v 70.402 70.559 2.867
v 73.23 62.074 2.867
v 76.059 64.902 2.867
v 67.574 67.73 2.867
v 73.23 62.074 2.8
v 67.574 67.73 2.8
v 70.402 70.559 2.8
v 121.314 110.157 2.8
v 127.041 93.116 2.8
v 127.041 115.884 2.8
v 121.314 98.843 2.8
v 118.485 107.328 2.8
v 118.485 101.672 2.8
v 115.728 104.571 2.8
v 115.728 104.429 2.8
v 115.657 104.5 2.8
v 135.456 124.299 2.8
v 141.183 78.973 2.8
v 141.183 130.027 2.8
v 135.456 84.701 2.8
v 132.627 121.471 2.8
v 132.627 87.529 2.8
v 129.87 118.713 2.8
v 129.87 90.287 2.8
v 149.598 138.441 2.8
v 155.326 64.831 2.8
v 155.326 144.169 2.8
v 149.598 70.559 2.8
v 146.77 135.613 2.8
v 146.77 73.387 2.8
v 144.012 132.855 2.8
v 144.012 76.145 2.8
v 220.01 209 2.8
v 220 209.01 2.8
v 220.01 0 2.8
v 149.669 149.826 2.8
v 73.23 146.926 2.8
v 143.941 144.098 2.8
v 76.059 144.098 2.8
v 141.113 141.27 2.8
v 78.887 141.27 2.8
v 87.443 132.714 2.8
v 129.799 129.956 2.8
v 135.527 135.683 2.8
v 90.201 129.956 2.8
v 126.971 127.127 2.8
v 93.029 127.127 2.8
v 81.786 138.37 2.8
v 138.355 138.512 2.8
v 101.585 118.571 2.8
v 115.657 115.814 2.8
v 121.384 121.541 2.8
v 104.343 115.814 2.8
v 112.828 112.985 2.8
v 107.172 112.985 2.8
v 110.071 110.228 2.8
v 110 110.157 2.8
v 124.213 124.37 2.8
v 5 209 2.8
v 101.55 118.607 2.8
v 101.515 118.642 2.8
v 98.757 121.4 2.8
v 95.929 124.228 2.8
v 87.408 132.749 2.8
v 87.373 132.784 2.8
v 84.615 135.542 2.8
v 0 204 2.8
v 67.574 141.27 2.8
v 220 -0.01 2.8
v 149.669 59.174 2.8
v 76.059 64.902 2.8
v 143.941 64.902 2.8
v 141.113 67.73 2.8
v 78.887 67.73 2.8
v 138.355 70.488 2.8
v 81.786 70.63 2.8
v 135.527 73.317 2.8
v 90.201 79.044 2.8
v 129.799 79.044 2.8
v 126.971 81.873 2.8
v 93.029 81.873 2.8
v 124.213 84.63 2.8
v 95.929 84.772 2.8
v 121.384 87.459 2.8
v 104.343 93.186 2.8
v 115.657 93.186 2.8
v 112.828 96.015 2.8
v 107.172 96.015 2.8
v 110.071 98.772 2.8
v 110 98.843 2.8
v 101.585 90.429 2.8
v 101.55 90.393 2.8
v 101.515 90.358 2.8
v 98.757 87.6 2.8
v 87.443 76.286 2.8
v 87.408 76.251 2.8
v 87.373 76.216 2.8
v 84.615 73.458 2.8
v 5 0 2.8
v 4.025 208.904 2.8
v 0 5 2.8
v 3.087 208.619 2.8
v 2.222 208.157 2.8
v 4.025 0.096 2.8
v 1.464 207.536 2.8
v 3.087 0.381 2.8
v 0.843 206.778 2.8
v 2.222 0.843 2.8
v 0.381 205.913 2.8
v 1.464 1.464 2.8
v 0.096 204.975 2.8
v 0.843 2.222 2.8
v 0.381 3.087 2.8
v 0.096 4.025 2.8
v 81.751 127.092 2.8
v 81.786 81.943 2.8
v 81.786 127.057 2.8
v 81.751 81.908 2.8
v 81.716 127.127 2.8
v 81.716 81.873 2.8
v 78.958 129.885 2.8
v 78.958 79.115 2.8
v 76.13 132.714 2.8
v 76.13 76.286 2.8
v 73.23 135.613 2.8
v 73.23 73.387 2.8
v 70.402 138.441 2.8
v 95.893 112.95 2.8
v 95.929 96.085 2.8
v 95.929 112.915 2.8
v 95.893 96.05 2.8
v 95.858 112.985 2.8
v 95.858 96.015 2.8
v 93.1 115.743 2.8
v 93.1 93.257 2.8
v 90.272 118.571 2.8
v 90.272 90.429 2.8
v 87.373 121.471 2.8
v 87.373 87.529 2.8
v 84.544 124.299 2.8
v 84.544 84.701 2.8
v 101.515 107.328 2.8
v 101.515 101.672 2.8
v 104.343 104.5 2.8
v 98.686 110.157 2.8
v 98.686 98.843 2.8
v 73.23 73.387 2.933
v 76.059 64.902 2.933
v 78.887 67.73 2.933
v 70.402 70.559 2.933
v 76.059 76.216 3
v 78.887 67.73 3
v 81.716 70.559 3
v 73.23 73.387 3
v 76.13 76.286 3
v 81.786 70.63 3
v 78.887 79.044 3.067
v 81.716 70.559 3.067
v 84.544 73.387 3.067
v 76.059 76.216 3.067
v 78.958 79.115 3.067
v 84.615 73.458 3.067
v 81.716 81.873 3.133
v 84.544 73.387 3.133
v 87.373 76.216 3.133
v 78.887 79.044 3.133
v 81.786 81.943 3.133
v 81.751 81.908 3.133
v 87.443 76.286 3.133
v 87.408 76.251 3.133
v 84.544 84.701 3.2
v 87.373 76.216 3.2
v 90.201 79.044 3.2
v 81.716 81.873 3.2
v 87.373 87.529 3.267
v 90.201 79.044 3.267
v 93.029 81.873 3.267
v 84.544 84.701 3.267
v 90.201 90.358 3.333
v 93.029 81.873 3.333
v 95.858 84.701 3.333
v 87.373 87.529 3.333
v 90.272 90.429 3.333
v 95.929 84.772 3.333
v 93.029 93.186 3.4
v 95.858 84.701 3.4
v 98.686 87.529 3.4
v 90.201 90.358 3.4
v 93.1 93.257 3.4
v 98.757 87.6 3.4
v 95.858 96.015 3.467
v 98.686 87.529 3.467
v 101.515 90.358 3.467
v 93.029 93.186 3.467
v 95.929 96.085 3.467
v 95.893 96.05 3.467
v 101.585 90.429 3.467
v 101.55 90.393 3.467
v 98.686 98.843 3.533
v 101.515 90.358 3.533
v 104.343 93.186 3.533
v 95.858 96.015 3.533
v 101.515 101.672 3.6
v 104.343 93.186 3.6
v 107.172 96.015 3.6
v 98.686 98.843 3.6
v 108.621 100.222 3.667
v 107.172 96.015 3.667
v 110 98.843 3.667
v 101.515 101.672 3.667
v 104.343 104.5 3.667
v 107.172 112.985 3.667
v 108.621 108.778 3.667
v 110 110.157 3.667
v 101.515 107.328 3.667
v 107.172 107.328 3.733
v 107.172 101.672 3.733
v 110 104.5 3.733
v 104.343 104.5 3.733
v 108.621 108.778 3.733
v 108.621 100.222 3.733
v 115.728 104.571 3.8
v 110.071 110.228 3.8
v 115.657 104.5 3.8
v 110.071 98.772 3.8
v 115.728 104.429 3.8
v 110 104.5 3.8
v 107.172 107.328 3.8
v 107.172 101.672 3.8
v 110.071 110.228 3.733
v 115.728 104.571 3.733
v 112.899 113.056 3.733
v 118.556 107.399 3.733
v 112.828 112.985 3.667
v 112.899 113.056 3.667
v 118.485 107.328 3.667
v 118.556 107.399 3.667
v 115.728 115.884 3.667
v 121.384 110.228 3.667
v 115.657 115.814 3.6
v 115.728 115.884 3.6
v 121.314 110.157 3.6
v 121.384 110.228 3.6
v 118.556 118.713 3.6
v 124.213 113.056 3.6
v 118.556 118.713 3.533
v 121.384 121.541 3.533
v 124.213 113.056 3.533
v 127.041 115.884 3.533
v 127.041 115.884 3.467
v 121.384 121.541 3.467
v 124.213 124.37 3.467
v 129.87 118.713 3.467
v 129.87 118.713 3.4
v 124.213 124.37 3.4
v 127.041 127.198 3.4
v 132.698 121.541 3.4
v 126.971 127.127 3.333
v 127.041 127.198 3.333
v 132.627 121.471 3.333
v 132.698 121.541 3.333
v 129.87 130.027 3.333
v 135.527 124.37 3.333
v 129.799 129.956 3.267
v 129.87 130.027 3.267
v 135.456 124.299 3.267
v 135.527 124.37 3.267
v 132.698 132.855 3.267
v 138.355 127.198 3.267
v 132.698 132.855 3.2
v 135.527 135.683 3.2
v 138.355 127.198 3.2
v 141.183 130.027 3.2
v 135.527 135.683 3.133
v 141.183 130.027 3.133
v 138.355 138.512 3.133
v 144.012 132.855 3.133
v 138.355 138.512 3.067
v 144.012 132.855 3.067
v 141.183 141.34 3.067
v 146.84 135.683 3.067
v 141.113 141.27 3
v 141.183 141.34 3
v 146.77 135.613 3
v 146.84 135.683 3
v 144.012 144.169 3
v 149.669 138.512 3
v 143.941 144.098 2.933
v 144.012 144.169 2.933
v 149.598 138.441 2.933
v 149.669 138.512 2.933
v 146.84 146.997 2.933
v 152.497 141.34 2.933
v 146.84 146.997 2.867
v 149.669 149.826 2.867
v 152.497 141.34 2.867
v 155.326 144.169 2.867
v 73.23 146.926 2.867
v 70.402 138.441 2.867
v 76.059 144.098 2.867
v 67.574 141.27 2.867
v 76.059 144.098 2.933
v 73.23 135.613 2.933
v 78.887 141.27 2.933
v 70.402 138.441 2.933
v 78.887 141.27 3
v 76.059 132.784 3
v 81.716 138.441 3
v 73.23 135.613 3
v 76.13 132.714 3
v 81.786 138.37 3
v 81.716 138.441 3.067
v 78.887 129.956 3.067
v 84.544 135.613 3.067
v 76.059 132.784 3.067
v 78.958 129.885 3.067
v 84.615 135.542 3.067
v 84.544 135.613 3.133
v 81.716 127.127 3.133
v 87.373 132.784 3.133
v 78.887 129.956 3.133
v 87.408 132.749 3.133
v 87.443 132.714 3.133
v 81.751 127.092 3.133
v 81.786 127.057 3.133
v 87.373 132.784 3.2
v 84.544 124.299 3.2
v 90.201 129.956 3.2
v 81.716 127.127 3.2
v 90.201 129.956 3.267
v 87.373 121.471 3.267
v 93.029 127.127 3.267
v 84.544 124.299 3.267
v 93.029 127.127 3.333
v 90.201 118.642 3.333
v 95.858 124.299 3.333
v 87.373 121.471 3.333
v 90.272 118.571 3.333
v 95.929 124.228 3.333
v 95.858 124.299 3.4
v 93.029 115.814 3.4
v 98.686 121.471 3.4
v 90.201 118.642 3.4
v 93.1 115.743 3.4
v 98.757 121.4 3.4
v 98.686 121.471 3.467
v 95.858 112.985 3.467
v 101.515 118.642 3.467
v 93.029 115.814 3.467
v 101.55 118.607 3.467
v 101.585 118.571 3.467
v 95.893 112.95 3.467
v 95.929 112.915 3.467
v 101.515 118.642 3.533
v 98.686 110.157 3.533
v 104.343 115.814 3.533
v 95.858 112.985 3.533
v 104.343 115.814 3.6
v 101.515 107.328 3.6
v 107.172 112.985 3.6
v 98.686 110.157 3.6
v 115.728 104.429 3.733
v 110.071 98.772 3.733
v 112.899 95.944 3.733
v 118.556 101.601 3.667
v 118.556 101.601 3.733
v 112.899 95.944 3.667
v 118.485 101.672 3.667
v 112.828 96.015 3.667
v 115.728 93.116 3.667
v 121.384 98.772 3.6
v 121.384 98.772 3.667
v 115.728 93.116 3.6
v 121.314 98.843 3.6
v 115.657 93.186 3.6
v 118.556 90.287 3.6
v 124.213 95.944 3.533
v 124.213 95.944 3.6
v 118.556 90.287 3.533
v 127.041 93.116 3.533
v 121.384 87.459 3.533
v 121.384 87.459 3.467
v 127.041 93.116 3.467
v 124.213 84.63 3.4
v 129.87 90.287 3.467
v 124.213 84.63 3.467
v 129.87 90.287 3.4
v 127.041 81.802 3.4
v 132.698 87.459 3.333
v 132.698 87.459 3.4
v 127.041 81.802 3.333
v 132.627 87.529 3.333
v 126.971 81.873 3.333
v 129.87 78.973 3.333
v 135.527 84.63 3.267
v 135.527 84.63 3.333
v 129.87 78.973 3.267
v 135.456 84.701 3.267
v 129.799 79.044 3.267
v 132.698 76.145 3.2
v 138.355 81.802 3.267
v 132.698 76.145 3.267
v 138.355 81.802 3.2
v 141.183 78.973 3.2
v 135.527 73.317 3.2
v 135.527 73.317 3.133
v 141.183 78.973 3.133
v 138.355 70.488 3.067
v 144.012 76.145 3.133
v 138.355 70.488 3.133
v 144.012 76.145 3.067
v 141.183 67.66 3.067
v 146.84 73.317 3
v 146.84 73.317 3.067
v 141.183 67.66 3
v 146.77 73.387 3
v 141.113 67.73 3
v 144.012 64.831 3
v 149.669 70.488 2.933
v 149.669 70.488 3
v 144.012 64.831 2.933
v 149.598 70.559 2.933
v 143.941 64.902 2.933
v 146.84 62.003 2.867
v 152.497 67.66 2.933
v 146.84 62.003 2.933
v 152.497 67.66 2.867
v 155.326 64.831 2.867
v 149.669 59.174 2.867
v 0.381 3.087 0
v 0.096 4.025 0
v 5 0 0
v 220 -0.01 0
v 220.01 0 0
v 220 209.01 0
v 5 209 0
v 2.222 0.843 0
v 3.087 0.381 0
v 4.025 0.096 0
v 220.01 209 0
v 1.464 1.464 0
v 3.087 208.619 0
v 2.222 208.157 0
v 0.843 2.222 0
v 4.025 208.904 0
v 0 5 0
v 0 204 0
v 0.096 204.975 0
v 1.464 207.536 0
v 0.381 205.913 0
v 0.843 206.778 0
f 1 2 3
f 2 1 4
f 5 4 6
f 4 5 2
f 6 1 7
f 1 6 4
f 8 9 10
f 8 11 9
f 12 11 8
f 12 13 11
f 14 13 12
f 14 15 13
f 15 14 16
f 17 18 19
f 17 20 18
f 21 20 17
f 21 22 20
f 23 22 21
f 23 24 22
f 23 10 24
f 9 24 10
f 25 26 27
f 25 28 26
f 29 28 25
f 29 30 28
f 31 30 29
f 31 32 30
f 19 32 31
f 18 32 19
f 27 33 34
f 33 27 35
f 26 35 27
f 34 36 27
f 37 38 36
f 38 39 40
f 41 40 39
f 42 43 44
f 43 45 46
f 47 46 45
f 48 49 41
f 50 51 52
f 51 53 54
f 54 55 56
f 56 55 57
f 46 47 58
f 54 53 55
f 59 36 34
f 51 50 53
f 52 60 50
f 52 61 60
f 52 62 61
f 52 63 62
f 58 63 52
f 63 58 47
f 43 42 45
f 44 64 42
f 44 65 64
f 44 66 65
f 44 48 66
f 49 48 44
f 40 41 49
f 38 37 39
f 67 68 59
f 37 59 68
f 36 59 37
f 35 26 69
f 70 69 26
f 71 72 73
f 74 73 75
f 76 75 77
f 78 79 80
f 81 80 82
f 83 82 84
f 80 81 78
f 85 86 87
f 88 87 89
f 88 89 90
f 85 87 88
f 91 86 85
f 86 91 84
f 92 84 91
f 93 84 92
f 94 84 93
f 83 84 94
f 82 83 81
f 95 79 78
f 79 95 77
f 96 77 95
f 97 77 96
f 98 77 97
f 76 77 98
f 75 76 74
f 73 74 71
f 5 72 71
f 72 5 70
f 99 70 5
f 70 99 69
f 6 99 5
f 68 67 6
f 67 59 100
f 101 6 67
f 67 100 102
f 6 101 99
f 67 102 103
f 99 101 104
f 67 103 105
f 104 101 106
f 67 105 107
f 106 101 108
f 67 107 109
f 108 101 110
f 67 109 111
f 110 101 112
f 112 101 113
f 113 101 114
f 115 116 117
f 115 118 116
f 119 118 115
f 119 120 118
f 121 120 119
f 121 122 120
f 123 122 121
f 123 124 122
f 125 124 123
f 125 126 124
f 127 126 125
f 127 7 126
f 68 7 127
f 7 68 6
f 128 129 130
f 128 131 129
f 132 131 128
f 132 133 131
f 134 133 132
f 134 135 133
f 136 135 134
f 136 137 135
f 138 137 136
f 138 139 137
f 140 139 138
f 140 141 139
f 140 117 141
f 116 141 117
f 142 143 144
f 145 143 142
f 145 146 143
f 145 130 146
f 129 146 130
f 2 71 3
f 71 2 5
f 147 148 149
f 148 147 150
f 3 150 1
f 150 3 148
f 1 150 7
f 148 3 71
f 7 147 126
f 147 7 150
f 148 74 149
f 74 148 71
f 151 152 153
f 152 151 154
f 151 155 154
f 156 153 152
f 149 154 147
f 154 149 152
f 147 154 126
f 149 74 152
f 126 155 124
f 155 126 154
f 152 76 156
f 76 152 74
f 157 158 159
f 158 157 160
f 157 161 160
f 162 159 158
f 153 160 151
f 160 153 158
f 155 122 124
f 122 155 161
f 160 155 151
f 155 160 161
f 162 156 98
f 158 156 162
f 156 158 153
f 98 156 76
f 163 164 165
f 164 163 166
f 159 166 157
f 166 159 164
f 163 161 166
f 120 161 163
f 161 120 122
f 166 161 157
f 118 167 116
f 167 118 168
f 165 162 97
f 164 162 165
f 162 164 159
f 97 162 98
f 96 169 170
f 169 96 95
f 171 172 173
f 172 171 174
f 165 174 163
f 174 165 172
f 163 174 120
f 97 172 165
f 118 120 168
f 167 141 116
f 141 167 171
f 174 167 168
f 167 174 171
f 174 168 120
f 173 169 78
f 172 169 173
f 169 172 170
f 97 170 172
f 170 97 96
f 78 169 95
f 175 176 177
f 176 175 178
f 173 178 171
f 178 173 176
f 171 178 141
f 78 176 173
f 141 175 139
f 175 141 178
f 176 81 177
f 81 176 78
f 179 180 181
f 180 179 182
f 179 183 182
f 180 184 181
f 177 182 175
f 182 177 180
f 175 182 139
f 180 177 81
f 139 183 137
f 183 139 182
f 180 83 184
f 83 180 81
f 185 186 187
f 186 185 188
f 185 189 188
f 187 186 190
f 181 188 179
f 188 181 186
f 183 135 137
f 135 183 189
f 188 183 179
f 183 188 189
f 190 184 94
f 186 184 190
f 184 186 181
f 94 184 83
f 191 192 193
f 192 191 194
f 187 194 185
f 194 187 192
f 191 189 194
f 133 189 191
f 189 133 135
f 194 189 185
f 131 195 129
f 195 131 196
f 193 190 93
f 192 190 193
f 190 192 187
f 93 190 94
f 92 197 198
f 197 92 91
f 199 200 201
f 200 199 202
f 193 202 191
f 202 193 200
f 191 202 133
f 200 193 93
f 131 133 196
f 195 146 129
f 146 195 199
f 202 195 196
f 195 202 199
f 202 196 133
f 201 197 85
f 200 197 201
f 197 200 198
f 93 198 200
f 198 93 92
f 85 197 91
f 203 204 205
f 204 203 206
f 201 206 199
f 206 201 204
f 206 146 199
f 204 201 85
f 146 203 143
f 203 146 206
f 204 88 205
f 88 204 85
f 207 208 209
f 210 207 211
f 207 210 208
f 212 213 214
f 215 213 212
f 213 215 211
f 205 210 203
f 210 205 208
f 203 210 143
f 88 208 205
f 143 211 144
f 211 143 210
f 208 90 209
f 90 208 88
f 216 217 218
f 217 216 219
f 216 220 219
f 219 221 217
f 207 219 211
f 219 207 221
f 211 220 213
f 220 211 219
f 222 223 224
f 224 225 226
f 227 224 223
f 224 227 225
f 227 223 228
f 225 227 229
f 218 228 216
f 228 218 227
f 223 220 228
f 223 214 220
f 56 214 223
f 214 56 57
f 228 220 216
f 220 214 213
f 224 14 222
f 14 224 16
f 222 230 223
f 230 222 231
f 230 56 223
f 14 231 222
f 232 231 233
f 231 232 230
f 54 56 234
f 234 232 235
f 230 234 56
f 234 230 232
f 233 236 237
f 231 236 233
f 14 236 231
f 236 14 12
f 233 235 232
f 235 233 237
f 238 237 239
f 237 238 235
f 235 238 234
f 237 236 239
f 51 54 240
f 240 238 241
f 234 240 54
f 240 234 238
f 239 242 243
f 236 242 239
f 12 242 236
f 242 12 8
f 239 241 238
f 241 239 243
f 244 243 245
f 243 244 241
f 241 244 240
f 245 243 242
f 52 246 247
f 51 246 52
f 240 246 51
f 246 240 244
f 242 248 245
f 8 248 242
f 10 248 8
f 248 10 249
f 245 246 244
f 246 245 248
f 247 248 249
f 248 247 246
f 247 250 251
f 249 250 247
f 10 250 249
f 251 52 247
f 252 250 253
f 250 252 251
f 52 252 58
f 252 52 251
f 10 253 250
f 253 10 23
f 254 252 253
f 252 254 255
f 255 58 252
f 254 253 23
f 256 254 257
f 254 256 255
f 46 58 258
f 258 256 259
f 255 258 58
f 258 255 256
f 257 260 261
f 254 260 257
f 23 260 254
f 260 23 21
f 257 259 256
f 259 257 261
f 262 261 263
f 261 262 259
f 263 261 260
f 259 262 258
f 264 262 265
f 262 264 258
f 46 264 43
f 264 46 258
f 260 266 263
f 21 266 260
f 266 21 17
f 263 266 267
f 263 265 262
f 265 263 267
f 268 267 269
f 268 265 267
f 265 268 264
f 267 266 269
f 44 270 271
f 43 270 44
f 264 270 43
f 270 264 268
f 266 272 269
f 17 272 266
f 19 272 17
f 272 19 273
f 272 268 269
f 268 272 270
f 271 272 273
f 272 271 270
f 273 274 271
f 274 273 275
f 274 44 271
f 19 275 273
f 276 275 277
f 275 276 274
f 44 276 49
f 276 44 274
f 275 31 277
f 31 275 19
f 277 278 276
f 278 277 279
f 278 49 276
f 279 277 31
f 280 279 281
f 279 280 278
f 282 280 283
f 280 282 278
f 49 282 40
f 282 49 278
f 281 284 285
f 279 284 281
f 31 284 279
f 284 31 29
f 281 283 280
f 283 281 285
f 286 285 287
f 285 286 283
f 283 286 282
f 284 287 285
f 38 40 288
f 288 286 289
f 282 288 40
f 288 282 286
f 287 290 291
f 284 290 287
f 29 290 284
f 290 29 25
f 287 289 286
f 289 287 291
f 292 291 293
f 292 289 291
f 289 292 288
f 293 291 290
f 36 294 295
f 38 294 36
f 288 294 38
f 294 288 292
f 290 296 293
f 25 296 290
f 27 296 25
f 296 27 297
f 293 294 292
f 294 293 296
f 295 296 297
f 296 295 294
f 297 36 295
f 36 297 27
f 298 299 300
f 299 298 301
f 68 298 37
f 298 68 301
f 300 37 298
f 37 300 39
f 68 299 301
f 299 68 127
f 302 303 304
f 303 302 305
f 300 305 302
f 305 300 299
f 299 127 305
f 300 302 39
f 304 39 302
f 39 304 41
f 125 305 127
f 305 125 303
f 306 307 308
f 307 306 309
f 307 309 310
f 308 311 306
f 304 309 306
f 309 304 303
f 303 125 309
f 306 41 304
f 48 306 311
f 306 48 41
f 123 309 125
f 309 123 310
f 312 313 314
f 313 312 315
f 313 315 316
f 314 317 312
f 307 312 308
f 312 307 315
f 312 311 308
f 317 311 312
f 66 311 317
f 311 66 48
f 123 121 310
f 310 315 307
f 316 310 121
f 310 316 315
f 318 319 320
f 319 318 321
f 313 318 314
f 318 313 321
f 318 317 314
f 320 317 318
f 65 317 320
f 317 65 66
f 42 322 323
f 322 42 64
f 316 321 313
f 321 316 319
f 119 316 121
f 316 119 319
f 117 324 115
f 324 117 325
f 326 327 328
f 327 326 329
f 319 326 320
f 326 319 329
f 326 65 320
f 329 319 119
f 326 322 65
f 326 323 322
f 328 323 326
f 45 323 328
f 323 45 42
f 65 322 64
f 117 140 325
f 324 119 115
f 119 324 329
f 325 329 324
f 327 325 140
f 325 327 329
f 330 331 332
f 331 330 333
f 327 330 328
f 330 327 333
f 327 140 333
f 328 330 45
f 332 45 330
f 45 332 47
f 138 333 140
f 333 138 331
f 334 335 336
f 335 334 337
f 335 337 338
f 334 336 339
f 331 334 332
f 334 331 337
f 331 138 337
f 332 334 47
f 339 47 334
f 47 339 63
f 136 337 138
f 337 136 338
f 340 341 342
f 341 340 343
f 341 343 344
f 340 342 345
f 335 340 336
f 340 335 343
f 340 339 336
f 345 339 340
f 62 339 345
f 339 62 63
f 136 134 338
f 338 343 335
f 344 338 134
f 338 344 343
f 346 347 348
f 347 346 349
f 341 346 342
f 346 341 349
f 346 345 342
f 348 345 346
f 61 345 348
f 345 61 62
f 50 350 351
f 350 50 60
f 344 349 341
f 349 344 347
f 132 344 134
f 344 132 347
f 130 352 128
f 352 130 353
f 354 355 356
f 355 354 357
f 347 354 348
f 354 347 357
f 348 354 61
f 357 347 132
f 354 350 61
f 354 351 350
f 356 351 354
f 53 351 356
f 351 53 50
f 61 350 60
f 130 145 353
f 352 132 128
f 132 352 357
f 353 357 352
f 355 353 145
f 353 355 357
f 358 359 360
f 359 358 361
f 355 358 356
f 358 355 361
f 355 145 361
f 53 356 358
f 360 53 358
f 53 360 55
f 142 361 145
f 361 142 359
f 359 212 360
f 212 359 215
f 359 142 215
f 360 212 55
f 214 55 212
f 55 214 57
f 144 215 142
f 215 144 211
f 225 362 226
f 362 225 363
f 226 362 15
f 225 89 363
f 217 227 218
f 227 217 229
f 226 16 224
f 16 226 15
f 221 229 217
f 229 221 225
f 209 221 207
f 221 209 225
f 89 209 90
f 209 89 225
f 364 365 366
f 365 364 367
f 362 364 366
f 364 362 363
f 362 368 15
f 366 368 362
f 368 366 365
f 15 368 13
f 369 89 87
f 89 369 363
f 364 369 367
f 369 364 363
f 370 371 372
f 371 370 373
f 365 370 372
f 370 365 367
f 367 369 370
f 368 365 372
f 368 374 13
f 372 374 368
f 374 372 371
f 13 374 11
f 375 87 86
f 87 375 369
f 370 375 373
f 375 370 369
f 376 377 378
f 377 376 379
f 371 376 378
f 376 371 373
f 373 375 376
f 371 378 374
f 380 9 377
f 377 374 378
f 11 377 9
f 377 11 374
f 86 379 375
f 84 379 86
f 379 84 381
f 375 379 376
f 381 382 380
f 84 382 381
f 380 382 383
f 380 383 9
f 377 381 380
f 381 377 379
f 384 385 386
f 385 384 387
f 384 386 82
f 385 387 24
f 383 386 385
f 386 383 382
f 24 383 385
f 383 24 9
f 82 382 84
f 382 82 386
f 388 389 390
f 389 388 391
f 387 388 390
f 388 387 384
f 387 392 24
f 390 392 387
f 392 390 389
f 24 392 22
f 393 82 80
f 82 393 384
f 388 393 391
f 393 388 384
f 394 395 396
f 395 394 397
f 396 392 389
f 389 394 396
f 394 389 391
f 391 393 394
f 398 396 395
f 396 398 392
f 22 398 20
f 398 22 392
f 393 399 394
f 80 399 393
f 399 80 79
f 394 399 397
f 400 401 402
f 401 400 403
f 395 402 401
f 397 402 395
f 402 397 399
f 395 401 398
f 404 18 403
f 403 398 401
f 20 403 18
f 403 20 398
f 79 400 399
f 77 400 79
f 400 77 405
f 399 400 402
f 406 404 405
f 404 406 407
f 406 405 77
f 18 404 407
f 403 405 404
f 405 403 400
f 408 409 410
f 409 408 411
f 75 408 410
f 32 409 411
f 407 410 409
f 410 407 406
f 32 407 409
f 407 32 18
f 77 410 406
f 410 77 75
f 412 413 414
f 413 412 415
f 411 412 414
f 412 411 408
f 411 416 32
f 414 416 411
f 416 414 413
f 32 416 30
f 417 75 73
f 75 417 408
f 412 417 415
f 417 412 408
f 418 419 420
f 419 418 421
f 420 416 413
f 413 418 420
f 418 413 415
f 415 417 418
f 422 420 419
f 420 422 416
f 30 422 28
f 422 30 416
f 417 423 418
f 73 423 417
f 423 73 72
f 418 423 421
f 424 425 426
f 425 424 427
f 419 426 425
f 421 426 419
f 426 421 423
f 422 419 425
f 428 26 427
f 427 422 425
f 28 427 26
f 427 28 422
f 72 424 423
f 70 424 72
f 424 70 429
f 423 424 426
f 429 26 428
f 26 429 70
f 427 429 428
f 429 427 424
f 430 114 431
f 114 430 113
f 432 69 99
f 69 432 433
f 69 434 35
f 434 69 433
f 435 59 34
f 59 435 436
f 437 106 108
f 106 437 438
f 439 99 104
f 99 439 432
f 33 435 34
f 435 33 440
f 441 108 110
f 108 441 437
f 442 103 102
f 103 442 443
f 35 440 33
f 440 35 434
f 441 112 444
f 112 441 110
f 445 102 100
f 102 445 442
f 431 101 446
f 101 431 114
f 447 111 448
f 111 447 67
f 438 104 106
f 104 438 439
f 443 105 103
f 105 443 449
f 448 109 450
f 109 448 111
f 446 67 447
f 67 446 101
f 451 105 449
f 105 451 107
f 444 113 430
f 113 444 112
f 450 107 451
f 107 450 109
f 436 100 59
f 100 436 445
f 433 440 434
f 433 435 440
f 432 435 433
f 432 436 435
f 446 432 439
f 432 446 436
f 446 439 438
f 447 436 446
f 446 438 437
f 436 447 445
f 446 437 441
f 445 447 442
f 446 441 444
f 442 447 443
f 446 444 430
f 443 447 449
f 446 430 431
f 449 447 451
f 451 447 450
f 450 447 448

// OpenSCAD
// 机箱前面板 - A部分
// 尺寸: 220mm x 209mm x 2.8mm
// 接缝处无倒角
// 中心凸起 X 图案

// 参数
width = 220;     // 宽度 (mm)
height = 209;    // 高度 (mm)
thickness = 2.8; // 厚度 (mm)
corner_radius = 5;  // 倒角半径 (mm)

// X 图案参数
x_max_height = 1.0;  // X 中心最大凸起高度 (mm)
x_width = 8;         // X 线条宽度 (mm)
x_diagonal = 120;    // X 对角线长度 (mm)

// 圆角矩形模块 - 只在左侧、上侧、下侧倒角，右侧（接缝处）不倒角
module rounded_rect_one_side(w, h, r, t) {
    hull() {
        // 左下角
        translate([r, r, 0]) cylinder(h = t, r = r, $fn = 32);
        // 左上角
        translate([r, h - r, 0]) cylinder(h = t, r = r, $fn = 32);
        // 右上角（接缝处，不倒角）
        translate([w, h, 0])
        cylinder(h = t, r = 0.01, $fn = 4);
        // 右下角（接缝处，不倒角）
        translate([w, 0, 0])
        cylinder(h = t, r = 0.01, $fn = 4);
    }
}

// 创建面板
difference() {
    union() {
        // 面板主体
        color("LightGray") {
            rounded_rect_one_side(width, height, corner_radius, thickness);
        }

        // X 图案
        color("DarkGray") {
            translate([width/2, height/2, 0])
            x_pattern();
        }
    }
}

// X 图案模块 - 中心凸起向边缘渐变
module x_pattern() {
    segments = 30;  // 每条线分为多少段
    segment_length = x_diagonal / segments;

    union() {
        // 第一条对角线 (从左下到右上)
        for (i = [-segments/2:segments/2-1]) {
            // 距离中心的相对距离 (0 到 0.5)
            dist_ratio = abs(i) / (segments/2);

            // 当前段的高度：中心1mm，边缘0mm
            current_height = x_max_height * (1 - dist_ratio);

            translate([0, 0, thickness])
            rotate([0, 0, 45])
            translate([i * segment_length, -x_width/2, 0])
            cube([segment_length + 0.1, x_width, current_height]);
        }

        // 第二条对角线 (从左上到右下)
        for (i = [-segments/2:segments/2-1]) {
            dist_ratio = abs(i) / (segments/2);
            current_height = x_max_height * (1 - dist_ratio);

            translate([0, 0, thickness])
            rotate([0, 0, -45])
            translate([i * segment_length, -x_width/2, 0])
            cube([segment_length + 0.1, x_width, current_height]);
        }
    }
}
